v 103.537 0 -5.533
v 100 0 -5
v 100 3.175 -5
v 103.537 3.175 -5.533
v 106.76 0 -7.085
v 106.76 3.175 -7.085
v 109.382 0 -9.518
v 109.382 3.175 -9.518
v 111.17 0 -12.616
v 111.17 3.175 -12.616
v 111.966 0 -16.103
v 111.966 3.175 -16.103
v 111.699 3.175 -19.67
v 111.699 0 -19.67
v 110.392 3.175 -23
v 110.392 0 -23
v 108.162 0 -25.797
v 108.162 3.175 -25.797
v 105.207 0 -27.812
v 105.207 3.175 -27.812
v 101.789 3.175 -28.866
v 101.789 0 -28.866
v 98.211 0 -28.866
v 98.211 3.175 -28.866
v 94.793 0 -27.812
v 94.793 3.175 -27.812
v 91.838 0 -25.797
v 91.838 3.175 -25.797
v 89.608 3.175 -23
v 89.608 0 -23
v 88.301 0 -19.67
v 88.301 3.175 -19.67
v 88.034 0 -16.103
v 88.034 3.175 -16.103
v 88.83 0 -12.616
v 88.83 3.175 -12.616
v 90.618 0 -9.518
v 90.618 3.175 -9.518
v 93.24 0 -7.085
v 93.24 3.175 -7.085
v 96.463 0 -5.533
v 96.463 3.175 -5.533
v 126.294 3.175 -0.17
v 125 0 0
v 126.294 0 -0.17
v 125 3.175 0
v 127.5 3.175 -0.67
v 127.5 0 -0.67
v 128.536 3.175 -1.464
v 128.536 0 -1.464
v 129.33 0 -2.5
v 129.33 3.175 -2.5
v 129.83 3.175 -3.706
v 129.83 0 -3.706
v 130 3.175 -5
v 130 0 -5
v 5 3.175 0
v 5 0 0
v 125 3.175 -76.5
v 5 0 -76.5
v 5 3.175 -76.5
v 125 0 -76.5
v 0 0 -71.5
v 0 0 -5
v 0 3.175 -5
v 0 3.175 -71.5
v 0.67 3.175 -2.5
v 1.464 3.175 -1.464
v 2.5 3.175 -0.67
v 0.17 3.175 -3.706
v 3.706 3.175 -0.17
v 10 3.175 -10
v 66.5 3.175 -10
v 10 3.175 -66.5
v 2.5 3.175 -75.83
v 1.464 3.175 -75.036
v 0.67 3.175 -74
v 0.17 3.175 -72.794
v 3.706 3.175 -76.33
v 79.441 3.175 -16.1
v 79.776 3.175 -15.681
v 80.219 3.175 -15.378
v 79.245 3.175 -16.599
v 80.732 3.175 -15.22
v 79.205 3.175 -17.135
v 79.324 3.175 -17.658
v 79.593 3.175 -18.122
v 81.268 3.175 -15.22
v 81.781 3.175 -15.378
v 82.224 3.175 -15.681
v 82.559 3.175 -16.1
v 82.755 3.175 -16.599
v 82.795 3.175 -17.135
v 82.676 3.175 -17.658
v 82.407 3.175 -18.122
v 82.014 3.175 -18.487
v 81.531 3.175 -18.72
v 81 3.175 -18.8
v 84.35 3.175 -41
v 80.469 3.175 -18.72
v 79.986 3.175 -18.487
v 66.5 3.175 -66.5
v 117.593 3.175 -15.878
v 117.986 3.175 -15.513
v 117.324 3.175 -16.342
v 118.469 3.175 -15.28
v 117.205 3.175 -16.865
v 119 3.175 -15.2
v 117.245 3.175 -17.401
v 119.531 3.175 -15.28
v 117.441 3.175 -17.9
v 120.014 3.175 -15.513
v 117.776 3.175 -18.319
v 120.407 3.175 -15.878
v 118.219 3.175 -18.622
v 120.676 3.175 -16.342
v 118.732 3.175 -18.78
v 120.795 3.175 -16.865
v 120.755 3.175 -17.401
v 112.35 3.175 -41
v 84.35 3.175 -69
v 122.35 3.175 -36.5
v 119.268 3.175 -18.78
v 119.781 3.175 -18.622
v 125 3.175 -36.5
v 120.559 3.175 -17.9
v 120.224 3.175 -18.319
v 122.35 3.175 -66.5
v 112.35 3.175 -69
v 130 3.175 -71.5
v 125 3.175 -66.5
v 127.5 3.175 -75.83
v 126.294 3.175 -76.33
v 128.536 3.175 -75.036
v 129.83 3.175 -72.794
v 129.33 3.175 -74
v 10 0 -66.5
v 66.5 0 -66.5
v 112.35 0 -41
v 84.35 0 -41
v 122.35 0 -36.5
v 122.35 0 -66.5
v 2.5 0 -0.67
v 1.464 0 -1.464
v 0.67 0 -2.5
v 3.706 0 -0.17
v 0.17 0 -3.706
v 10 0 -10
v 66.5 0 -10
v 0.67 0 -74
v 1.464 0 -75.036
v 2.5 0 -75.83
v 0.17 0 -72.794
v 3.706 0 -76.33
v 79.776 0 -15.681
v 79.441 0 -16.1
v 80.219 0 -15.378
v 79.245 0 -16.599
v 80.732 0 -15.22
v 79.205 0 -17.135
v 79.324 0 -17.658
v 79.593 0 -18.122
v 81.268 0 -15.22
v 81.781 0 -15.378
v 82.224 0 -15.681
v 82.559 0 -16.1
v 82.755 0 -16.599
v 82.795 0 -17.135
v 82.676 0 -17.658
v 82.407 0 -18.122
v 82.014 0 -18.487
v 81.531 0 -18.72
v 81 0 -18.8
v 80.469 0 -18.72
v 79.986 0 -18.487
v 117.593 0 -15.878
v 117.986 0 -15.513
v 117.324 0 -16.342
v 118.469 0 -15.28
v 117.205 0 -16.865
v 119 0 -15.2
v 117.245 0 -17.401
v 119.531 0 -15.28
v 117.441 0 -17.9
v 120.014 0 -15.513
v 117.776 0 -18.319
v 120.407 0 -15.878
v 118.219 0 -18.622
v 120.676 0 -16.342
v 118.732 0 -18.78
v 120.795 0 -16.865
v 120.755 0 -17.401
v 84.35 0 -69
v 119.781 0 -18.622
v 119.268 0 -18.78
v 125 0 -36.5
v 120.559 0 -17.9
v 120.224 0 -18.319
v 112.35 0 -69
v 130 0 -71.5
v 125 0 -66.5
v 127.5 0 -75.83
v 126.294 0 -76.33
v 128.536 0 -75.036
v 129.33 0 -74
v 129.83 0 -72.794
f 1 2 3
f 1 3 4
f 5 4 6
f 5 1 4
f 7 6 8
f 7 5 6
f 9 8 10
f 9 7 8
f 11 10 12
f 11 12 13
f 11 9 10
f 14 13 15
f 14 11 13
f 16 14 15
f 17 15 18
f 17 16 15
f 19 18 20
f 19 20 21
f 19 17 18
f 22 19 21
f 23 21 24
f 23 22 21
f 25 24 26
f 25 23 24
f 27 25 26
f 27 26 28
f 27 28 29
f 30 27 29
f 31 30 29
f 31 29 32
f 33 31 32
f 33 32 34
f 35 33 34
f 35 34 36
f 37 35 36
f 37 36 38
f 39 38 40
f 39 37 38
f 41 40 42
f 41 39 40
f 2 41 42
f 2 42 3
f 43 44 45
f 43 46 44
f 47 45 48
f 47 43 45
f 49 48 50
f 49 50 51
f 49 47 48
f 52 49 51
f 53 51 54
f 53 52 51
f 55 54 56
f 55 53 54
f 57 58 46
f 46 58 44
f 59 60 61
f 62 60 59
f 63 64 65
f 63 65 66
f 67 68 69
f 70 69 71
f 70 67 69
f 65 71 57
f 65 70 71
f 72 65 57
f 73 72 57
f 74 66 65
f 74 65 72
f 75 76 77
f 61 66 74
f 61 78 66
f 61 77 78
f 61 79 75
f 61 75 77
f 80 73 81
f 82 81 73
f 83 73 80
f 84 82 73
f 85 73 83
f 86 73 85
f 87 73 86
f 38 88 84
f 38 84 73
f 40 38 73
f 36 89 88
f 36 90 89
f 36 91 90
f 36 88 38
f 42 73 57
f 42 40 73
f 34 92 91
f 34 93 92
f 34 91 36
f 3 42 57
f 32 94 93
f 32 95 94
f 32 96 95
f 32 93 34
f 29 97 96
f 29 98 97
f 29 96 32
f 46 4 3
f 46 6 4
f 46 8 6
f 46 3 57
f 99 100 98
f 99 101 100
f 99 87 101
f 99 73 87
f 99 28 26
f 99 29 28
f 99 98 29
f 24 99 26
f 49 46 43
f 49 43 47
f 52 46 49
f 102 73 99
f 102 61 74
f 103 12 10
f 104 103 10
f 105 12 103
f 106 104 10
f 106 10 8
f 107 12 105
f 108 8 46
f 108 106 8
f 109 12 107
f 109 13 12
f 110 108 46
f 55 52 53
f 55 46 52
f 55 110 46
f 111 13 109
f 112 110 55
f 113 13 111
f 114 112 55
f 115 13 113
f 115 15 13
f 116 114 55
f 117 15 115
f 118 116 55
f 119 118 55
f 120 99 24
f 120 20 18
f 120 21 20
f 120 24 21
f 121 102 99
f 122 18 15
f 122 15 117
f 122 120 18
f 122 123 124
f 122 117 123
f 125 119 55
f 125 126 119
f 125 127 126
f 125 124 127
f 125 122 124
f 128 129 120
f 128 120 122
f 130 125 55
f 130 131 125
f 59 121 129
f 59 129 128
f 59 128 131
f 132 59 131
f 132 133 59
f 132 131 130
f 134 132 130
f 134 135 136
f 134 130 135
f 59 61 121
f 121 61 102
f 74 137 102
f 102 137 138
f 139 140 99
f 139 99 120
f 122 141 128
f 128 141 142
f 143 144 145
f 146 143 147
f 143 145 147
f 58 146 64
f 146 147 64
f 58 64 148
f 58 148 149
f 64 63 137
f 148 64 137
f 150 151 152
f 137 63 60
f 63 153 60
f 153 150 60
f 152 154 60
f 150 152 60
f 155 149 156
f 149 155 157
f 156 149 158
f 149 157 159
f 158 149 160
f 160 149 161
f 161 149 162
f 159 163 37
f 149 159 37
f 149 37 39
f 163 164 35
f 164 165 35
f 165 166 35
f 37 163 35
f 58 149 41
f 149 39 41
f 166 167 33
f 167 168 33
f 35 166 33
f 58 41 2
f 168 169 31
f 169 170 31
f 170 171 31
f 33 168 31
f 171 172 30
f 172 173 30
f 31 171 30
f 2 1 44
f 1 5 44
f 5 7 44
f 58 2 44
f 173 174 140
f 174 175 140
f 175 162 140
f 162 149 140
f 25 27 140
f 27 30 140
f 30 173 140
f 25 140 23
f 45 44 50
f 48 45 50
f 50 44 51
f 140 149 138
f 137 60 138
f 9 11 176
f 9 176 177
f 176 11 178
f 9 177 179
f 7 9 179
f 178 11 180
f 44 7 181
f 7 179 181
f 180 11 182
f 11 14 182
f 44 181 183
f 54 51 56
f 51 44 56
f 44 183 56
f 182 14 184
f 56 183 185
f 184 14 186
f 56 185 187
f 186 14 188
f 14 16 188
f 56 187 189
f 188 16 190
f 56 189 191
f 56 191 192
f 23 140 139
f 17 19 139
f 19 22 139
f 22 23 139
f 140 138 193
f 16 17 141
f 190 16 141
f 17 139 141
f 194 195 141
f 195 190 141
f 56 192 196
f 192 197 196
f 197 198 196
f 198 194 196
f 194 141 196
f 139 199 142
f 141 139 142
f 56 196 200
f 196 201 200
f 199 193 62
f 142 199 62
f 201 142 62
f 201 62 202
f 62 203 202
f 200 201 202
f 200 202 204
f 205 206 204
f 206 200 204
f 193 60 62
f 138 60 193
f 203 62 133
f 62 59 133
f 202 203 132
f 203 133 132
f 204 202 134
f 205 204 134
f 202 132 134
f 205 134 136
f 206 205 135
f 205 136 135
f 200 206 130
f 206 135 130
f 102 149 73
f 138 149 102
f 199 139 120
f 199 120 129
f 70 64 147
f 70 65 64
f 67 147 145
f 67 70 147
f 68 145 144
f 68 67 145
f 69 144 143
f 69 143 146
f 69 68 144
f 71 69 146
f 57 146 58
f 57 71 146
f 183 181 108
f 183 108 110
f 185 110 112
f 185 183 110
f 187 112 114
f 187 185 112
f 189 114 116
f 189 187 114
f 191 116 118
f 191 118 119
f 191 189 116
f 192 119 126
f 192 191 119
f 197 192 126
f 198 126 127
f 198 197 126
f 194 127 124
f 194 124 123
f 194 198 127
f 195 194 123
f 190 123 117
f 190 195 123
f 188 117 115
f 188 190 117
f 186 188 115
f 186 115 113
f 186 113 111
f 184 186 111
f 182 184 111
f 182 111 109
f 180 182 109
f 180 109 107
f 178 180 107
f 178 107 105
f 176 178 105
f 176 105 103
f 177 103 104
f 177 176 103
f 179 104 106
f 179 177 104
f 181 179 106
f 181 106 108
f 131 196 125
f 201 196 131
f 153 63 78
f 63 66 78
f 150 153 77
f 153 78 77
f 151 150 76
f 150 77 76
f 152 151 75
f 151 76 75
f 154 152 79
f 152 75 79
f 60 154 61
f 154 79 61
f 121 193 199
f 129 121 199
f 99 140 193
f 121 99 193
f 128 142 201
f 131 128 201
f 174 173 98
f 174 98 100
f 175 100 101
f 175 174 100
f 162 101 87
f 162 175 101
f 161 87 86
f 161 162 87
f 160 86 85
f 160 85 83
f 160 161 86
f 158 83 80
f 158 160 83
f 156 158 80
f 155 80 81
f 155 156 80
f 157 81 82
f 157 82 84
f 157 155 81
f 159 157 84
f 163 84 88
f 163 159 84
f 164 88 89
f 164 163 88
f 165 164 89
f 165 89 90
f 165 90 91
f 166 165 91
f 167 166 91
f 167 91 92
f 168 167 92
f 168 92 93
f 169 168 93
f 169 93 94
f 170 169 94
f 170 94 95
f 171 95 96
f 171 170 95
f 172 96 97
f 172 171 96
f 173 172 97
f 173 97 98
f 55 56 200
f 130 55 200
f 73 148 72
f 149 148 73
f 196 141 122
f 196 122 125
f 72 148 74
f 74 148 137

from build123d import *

# Parameters (mm, degrees)
SKETCH1_W           = 130
SKETCH1_H           = 76.5
SKETCH1_R           = 12
SKETCH1_R_2         = 1.8
SKETCH1_W_2         = 56.5
SKETCH1_H_2         = 56.5
SKETCH1_W_3         = 28
SKETCH1_H_3         = 28
SKETCH1_W_4         = 2.65
SKETCH1_H_4         = 30
BOSS_EXTRUDE1_DEPTH = 3.175
FILLET1_R           = 5


with BuildPart() as part:
    # Sketch1 → Boss-Extrude1 (new body)
    with BuildSketch(Plane(origin=(0, 0, 0), x_dir=(1, 0, 0), z_dir=(0, 1, 0))):
        with Locations((65, 38.25)):
            Rectangle(SKETCH1_W, SKETCH1_H)
        with Locations(Location((100, 17, 0), (0, 0, 270))):
            Circle(SKETCH1_R, mode=Mode.SUBTRACT)
        with Locations(Location((119, 17, 0), (0, 0, 270))):
            Circle(SKETCH1_R_2, mode=Mode.SUBTRACT)
        with Locations(Location((81, 17, 0), (0, 0, 90))):
            Circle(SKETCH1_R_2, mode=Mode.SUBTRACT)
        with Locations((38.25, 38.25)):
            Rectangle(SKETCH1_W_2, SKETCH1_H_2, mode=Mode.SUBTRACT)
        with Locations((98.35, 55)):
            Rectangle(SKETCH1_W_3, SKETCH1_H_3, mode=Mode.SUBTRACT)
        with Locations((123.675, 51.5)):
            Rectangle(SKETCH1_W_4, SKETCH1_H_4, mode=Mode.SUBTRACT)
    extrude(amount=BOSS_EXTRUDE1_DEPTH)

    # Fillet1
    fillet1_edges = [part.edges().sort_by_distance(p)[0] for p in [
        (0, 1.5875, -76.5),
        (130, 1.5875, -76.5),
        (130, 1.5875, 0),
        (0, 1.5875, 0),
    ]]
    fillet(fillet1_edges, radius=FILLET1_R)


solid = part.part
